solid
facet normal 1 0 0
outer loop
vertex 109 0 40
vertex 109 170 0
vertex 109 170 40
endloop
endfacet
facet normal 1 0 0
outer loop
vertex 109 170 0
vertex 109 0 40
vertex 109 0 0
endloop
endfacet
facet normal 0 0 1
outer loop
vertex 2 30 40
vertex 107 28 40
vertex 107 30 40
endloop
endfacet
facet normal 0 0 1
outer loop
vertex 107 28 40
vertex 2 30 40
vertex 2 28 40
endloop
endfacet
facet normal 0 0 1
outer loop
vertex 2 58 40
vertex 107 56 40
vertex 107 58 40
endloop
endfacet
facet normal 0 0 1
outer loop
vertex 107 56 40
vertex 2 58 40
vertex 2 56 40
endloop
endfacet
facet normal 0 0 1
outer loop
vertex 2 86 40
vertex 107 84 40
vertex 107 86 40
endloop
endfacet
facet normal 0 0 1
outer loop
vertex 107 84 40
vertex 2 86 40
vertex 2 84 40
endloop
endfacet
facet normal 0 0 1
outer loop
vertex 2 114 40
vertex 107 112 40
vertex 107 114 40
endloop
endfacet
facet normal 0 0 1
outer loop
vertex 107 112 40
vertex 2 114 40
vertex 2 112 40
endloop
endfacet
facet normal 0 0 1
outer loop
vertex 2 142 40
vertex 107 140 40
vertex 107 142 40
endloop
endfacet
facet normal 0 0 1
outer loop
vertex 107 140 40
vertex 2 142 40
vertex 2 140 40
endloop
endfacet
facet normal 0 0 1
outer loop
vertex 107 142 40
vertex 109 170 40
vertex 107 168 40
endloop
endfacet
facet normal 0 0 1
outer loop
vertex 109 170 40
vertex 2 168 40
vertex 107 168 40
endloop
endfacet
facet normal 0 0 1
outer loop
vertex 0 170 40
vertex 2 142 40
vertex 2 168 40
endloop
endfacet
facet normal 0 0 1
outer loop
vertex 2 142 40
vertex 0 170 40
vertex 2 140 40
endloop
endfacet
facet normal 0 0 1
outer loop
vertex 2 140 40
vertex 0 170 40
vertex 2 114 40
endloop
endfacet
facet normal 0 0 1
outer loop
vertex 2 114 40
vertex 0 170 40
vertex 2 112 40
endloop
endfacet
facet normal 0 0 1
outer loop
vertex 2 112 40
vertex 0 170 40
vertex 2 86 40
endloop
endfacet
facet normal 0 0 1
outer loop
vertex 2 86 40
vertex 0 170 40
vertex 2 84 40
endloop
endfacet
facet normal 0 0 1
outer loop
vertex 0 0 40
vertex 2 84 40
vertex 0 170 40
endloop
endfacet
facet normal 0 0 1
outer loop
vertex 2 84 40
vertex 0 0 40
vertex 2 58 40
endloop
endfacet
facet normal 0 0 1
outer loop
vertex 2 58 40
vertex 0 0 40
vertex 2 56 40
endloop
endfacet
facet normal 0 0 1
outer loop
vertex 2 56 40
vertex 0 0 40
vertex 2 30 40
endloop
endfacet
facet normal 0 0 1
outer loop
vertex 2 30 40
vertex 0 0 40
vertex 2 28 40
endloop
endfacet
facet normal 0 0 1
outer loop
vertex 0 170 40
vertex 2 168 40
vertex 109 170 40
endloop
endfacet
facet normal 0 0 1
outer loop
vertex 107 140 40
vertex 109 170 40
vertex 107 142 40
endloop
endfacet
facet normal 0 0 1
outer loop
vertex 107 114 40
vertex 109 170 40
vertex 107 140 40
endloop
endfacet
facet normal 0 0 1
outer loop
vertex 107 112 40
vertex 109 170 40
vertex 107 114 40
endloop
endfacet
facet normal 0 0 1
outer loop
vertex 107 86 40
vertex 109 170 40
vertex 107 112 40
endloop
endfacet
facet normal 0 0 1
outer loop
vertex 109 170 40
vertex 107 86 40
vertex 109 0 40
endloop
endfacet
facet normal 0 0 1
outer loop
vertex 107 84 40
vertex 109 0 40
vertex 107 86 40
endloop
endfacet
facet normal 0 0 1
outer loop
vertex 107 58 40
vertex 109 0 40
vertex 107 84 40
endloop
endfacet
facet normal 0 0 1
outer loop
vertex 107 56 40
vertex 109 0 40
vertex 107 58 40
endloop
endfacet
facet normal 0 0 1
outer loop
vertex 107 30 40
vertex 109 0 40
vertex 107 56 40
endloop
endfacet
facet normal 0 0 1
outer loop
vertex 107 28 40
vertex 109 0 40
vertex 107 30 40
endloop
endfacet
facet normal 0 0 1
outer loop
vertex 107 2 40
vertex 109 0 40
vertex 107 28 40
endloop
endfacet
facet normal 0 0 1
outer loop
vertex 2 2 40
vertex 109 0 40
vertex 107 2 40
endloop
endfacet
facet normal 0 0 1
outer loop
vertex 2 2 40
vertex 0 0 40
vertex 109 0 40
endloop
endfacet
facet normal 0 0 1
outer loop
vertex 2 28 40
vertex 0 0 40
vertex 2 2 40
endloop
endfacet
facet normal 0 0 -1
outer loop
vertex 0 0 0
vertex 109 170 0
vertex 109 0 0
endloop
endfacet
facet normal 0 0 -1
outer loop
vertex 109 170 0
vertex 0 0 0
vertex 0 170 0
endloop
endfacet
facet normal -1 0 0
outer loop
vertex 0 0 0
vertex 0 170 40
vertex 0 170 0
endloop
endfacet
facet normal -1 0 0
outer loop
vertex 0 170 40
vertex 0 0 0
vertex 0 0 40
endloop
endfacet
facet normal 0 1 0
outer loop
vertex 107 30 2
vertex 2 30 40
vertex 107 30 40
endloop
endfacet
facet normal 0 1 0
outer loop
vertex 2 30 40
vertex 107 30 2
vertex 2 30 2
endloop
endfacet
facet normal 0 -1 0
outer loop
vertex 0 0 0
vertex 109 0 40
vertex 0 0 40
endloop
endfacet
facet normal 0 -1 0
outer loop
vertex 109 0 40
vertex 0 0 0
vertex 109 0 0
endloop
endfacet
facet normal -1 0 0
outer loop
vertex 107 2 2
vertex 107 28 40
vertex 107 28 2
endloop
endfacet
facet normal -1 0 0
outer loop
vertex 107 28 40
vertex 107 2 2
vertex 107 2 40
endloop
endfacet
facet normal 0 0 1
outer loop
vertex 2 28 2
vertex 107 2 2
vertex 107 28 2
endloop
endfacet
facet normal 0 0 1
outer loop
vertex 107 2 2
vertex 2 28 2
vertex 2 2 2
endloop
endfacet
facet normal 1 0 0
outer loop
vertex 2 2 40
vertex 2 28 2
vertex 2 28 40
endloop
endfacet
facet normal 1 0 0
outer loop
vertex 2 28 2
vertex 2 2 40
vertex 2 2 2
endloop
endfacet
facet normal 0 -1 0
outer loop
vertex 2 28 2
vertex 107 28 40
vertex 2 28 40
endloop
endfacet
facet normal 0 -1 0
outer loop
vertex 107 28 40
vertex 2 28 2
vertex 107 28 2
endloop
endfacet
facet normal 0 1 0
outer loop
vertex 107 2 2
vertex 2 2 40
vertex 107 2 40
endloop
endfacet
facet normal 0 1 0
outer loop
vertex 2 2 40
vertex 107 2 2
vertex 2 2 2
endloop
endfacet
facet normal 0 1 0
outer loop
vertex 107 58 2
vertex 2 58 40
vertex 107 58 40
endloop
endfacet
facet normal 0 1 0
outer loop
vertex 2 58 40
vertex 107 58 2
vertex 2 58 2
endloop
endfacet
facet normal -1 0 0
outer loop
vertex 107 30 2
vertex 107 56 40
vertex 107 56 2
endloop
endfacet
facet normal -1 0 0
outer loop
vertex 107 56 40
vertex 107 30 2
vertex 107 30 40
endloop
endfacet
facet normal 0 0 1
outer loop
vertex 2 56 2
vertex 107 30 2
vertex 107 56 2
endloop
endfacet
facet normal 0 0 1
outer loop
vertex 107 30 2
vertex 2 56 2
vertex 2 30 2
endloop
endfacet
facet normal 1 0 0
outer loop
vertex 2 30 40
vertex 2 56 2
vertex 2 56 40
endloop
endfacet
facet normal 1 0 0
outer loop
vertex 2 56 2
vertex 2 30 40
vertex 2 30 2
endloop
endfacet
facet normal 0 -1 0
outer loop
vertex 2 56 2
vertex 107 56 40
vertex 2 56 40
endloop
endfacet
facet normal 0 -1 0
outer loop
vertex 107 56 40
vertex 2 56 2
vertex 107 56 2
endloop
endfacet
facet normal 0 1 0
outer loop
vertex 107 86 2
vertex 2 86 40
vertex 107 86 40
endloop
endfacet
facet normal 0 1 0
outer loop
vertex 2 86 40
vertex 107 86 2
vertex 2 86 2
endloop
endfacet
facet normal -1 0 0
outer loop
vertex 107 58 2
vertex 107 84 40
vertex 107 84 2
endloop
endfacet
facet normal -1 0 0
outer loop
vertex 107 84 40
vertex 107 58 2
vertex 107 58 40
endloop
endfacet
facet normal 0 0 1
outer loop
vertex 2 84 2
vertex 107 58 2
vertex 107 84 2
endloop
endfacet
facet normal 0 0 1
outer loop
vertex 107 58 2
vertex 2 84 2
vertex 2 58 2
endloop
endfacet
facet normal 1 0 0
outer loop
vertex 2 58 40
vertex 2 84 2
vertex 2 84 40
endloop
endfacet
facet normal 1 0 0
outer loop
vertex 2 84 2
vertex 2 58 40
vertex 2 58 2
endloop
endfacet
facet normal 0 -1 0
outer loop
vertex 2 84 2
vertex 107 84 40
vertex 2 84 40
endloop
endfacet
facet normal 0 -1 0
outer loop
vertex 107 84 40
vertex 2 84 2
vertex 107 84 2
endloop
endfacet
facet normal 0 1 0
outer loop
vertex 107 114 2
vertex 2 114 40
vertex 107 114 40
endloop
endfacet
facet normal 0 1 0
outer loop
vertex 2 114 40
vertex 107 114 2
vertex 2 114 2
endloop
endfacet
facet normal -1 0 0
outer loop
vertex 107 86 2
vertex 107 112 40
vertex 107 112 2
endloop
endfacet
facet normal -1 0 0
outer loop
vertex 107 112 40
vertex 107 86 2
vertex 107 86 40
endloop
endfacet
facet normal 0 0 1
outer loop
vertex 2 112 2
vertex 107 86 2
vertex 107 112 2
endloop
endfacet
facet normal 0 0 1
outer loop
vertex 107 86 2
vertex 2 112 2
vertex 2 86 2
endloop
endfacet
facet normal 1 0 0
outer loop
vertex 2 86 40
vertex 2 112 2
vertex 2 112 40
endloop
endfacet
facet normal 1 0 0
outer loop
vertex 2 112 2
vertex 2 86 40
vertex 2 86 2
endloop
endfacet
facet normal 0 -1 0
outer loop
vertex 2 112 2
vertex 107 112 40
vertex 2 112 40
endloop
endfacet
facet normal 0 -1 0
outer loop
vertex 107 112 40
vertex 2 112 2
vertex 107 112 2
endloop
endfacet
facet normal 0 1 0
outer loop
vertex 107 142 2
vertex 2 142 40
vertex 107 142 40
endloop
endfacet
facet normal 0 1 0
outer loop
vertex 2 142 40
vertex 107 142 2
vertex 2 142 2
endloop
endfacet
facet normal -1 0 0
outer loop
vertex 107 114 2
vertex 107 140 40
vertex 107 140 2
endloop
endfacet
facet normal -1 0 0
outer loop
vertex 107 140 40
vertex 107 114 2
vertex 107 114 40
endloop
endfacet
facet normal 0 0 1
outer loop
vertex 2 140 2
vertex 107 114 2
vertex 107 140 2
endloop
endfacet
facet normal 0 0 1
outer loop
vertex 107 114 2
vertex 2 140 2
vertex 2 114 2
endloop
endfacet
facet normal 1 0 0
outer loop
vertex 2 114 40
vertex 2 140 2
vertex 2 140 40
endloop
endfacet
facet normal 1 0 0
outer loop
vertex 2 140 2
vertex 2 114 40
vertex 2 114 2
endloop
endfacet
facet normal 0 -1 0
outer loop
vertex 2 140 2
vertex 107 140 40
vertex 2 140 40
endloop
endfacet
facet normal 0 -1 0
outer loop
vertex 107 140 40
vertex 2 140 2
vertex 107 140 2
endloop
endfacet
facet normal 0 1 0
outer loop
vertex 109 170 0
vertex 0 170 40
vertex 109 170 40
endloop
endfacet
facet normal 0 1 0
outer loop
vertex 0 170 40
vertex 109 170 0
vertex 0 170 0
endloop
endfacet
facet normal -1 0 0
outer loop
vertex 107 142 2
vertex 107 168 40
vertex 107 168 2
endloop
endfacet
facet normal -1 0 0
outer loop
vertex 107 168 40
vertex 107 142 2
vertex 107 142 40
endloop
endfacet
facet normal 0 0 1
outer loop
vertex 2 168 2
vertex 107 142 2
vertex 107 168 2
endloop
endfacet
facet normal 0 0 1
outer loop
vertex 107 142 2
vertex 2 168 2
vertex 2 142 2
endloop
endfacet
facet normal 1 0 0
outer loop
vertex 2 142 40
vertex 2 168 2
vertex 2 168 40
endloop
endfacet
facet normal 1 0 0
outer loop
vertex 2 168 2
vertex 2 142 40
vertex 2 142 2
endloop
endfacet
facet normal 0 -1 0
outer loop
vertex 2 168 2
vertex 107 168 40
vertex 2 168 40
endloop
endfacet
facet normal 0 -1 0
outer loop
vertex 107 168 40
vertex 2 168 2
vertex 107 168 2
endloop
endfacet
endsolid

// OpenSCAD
tykkelse=2;
x=105;
y=26;
z=40;
disktype=3.5;

// internt;
ty=tykkelse;

module boks() {
    difference() {
        cube([x+ty*2,y+ty*2,z]);
        
        translate([ty,ty,ty]) {
            cube([x,y,z]);
        }
    }
}

module storboks(antall) {
    for (t = [0:antall-1]) {
        translate([0, y*t+t*2, 0]) {
            boks();
        }
    }
}

storboks(6);
